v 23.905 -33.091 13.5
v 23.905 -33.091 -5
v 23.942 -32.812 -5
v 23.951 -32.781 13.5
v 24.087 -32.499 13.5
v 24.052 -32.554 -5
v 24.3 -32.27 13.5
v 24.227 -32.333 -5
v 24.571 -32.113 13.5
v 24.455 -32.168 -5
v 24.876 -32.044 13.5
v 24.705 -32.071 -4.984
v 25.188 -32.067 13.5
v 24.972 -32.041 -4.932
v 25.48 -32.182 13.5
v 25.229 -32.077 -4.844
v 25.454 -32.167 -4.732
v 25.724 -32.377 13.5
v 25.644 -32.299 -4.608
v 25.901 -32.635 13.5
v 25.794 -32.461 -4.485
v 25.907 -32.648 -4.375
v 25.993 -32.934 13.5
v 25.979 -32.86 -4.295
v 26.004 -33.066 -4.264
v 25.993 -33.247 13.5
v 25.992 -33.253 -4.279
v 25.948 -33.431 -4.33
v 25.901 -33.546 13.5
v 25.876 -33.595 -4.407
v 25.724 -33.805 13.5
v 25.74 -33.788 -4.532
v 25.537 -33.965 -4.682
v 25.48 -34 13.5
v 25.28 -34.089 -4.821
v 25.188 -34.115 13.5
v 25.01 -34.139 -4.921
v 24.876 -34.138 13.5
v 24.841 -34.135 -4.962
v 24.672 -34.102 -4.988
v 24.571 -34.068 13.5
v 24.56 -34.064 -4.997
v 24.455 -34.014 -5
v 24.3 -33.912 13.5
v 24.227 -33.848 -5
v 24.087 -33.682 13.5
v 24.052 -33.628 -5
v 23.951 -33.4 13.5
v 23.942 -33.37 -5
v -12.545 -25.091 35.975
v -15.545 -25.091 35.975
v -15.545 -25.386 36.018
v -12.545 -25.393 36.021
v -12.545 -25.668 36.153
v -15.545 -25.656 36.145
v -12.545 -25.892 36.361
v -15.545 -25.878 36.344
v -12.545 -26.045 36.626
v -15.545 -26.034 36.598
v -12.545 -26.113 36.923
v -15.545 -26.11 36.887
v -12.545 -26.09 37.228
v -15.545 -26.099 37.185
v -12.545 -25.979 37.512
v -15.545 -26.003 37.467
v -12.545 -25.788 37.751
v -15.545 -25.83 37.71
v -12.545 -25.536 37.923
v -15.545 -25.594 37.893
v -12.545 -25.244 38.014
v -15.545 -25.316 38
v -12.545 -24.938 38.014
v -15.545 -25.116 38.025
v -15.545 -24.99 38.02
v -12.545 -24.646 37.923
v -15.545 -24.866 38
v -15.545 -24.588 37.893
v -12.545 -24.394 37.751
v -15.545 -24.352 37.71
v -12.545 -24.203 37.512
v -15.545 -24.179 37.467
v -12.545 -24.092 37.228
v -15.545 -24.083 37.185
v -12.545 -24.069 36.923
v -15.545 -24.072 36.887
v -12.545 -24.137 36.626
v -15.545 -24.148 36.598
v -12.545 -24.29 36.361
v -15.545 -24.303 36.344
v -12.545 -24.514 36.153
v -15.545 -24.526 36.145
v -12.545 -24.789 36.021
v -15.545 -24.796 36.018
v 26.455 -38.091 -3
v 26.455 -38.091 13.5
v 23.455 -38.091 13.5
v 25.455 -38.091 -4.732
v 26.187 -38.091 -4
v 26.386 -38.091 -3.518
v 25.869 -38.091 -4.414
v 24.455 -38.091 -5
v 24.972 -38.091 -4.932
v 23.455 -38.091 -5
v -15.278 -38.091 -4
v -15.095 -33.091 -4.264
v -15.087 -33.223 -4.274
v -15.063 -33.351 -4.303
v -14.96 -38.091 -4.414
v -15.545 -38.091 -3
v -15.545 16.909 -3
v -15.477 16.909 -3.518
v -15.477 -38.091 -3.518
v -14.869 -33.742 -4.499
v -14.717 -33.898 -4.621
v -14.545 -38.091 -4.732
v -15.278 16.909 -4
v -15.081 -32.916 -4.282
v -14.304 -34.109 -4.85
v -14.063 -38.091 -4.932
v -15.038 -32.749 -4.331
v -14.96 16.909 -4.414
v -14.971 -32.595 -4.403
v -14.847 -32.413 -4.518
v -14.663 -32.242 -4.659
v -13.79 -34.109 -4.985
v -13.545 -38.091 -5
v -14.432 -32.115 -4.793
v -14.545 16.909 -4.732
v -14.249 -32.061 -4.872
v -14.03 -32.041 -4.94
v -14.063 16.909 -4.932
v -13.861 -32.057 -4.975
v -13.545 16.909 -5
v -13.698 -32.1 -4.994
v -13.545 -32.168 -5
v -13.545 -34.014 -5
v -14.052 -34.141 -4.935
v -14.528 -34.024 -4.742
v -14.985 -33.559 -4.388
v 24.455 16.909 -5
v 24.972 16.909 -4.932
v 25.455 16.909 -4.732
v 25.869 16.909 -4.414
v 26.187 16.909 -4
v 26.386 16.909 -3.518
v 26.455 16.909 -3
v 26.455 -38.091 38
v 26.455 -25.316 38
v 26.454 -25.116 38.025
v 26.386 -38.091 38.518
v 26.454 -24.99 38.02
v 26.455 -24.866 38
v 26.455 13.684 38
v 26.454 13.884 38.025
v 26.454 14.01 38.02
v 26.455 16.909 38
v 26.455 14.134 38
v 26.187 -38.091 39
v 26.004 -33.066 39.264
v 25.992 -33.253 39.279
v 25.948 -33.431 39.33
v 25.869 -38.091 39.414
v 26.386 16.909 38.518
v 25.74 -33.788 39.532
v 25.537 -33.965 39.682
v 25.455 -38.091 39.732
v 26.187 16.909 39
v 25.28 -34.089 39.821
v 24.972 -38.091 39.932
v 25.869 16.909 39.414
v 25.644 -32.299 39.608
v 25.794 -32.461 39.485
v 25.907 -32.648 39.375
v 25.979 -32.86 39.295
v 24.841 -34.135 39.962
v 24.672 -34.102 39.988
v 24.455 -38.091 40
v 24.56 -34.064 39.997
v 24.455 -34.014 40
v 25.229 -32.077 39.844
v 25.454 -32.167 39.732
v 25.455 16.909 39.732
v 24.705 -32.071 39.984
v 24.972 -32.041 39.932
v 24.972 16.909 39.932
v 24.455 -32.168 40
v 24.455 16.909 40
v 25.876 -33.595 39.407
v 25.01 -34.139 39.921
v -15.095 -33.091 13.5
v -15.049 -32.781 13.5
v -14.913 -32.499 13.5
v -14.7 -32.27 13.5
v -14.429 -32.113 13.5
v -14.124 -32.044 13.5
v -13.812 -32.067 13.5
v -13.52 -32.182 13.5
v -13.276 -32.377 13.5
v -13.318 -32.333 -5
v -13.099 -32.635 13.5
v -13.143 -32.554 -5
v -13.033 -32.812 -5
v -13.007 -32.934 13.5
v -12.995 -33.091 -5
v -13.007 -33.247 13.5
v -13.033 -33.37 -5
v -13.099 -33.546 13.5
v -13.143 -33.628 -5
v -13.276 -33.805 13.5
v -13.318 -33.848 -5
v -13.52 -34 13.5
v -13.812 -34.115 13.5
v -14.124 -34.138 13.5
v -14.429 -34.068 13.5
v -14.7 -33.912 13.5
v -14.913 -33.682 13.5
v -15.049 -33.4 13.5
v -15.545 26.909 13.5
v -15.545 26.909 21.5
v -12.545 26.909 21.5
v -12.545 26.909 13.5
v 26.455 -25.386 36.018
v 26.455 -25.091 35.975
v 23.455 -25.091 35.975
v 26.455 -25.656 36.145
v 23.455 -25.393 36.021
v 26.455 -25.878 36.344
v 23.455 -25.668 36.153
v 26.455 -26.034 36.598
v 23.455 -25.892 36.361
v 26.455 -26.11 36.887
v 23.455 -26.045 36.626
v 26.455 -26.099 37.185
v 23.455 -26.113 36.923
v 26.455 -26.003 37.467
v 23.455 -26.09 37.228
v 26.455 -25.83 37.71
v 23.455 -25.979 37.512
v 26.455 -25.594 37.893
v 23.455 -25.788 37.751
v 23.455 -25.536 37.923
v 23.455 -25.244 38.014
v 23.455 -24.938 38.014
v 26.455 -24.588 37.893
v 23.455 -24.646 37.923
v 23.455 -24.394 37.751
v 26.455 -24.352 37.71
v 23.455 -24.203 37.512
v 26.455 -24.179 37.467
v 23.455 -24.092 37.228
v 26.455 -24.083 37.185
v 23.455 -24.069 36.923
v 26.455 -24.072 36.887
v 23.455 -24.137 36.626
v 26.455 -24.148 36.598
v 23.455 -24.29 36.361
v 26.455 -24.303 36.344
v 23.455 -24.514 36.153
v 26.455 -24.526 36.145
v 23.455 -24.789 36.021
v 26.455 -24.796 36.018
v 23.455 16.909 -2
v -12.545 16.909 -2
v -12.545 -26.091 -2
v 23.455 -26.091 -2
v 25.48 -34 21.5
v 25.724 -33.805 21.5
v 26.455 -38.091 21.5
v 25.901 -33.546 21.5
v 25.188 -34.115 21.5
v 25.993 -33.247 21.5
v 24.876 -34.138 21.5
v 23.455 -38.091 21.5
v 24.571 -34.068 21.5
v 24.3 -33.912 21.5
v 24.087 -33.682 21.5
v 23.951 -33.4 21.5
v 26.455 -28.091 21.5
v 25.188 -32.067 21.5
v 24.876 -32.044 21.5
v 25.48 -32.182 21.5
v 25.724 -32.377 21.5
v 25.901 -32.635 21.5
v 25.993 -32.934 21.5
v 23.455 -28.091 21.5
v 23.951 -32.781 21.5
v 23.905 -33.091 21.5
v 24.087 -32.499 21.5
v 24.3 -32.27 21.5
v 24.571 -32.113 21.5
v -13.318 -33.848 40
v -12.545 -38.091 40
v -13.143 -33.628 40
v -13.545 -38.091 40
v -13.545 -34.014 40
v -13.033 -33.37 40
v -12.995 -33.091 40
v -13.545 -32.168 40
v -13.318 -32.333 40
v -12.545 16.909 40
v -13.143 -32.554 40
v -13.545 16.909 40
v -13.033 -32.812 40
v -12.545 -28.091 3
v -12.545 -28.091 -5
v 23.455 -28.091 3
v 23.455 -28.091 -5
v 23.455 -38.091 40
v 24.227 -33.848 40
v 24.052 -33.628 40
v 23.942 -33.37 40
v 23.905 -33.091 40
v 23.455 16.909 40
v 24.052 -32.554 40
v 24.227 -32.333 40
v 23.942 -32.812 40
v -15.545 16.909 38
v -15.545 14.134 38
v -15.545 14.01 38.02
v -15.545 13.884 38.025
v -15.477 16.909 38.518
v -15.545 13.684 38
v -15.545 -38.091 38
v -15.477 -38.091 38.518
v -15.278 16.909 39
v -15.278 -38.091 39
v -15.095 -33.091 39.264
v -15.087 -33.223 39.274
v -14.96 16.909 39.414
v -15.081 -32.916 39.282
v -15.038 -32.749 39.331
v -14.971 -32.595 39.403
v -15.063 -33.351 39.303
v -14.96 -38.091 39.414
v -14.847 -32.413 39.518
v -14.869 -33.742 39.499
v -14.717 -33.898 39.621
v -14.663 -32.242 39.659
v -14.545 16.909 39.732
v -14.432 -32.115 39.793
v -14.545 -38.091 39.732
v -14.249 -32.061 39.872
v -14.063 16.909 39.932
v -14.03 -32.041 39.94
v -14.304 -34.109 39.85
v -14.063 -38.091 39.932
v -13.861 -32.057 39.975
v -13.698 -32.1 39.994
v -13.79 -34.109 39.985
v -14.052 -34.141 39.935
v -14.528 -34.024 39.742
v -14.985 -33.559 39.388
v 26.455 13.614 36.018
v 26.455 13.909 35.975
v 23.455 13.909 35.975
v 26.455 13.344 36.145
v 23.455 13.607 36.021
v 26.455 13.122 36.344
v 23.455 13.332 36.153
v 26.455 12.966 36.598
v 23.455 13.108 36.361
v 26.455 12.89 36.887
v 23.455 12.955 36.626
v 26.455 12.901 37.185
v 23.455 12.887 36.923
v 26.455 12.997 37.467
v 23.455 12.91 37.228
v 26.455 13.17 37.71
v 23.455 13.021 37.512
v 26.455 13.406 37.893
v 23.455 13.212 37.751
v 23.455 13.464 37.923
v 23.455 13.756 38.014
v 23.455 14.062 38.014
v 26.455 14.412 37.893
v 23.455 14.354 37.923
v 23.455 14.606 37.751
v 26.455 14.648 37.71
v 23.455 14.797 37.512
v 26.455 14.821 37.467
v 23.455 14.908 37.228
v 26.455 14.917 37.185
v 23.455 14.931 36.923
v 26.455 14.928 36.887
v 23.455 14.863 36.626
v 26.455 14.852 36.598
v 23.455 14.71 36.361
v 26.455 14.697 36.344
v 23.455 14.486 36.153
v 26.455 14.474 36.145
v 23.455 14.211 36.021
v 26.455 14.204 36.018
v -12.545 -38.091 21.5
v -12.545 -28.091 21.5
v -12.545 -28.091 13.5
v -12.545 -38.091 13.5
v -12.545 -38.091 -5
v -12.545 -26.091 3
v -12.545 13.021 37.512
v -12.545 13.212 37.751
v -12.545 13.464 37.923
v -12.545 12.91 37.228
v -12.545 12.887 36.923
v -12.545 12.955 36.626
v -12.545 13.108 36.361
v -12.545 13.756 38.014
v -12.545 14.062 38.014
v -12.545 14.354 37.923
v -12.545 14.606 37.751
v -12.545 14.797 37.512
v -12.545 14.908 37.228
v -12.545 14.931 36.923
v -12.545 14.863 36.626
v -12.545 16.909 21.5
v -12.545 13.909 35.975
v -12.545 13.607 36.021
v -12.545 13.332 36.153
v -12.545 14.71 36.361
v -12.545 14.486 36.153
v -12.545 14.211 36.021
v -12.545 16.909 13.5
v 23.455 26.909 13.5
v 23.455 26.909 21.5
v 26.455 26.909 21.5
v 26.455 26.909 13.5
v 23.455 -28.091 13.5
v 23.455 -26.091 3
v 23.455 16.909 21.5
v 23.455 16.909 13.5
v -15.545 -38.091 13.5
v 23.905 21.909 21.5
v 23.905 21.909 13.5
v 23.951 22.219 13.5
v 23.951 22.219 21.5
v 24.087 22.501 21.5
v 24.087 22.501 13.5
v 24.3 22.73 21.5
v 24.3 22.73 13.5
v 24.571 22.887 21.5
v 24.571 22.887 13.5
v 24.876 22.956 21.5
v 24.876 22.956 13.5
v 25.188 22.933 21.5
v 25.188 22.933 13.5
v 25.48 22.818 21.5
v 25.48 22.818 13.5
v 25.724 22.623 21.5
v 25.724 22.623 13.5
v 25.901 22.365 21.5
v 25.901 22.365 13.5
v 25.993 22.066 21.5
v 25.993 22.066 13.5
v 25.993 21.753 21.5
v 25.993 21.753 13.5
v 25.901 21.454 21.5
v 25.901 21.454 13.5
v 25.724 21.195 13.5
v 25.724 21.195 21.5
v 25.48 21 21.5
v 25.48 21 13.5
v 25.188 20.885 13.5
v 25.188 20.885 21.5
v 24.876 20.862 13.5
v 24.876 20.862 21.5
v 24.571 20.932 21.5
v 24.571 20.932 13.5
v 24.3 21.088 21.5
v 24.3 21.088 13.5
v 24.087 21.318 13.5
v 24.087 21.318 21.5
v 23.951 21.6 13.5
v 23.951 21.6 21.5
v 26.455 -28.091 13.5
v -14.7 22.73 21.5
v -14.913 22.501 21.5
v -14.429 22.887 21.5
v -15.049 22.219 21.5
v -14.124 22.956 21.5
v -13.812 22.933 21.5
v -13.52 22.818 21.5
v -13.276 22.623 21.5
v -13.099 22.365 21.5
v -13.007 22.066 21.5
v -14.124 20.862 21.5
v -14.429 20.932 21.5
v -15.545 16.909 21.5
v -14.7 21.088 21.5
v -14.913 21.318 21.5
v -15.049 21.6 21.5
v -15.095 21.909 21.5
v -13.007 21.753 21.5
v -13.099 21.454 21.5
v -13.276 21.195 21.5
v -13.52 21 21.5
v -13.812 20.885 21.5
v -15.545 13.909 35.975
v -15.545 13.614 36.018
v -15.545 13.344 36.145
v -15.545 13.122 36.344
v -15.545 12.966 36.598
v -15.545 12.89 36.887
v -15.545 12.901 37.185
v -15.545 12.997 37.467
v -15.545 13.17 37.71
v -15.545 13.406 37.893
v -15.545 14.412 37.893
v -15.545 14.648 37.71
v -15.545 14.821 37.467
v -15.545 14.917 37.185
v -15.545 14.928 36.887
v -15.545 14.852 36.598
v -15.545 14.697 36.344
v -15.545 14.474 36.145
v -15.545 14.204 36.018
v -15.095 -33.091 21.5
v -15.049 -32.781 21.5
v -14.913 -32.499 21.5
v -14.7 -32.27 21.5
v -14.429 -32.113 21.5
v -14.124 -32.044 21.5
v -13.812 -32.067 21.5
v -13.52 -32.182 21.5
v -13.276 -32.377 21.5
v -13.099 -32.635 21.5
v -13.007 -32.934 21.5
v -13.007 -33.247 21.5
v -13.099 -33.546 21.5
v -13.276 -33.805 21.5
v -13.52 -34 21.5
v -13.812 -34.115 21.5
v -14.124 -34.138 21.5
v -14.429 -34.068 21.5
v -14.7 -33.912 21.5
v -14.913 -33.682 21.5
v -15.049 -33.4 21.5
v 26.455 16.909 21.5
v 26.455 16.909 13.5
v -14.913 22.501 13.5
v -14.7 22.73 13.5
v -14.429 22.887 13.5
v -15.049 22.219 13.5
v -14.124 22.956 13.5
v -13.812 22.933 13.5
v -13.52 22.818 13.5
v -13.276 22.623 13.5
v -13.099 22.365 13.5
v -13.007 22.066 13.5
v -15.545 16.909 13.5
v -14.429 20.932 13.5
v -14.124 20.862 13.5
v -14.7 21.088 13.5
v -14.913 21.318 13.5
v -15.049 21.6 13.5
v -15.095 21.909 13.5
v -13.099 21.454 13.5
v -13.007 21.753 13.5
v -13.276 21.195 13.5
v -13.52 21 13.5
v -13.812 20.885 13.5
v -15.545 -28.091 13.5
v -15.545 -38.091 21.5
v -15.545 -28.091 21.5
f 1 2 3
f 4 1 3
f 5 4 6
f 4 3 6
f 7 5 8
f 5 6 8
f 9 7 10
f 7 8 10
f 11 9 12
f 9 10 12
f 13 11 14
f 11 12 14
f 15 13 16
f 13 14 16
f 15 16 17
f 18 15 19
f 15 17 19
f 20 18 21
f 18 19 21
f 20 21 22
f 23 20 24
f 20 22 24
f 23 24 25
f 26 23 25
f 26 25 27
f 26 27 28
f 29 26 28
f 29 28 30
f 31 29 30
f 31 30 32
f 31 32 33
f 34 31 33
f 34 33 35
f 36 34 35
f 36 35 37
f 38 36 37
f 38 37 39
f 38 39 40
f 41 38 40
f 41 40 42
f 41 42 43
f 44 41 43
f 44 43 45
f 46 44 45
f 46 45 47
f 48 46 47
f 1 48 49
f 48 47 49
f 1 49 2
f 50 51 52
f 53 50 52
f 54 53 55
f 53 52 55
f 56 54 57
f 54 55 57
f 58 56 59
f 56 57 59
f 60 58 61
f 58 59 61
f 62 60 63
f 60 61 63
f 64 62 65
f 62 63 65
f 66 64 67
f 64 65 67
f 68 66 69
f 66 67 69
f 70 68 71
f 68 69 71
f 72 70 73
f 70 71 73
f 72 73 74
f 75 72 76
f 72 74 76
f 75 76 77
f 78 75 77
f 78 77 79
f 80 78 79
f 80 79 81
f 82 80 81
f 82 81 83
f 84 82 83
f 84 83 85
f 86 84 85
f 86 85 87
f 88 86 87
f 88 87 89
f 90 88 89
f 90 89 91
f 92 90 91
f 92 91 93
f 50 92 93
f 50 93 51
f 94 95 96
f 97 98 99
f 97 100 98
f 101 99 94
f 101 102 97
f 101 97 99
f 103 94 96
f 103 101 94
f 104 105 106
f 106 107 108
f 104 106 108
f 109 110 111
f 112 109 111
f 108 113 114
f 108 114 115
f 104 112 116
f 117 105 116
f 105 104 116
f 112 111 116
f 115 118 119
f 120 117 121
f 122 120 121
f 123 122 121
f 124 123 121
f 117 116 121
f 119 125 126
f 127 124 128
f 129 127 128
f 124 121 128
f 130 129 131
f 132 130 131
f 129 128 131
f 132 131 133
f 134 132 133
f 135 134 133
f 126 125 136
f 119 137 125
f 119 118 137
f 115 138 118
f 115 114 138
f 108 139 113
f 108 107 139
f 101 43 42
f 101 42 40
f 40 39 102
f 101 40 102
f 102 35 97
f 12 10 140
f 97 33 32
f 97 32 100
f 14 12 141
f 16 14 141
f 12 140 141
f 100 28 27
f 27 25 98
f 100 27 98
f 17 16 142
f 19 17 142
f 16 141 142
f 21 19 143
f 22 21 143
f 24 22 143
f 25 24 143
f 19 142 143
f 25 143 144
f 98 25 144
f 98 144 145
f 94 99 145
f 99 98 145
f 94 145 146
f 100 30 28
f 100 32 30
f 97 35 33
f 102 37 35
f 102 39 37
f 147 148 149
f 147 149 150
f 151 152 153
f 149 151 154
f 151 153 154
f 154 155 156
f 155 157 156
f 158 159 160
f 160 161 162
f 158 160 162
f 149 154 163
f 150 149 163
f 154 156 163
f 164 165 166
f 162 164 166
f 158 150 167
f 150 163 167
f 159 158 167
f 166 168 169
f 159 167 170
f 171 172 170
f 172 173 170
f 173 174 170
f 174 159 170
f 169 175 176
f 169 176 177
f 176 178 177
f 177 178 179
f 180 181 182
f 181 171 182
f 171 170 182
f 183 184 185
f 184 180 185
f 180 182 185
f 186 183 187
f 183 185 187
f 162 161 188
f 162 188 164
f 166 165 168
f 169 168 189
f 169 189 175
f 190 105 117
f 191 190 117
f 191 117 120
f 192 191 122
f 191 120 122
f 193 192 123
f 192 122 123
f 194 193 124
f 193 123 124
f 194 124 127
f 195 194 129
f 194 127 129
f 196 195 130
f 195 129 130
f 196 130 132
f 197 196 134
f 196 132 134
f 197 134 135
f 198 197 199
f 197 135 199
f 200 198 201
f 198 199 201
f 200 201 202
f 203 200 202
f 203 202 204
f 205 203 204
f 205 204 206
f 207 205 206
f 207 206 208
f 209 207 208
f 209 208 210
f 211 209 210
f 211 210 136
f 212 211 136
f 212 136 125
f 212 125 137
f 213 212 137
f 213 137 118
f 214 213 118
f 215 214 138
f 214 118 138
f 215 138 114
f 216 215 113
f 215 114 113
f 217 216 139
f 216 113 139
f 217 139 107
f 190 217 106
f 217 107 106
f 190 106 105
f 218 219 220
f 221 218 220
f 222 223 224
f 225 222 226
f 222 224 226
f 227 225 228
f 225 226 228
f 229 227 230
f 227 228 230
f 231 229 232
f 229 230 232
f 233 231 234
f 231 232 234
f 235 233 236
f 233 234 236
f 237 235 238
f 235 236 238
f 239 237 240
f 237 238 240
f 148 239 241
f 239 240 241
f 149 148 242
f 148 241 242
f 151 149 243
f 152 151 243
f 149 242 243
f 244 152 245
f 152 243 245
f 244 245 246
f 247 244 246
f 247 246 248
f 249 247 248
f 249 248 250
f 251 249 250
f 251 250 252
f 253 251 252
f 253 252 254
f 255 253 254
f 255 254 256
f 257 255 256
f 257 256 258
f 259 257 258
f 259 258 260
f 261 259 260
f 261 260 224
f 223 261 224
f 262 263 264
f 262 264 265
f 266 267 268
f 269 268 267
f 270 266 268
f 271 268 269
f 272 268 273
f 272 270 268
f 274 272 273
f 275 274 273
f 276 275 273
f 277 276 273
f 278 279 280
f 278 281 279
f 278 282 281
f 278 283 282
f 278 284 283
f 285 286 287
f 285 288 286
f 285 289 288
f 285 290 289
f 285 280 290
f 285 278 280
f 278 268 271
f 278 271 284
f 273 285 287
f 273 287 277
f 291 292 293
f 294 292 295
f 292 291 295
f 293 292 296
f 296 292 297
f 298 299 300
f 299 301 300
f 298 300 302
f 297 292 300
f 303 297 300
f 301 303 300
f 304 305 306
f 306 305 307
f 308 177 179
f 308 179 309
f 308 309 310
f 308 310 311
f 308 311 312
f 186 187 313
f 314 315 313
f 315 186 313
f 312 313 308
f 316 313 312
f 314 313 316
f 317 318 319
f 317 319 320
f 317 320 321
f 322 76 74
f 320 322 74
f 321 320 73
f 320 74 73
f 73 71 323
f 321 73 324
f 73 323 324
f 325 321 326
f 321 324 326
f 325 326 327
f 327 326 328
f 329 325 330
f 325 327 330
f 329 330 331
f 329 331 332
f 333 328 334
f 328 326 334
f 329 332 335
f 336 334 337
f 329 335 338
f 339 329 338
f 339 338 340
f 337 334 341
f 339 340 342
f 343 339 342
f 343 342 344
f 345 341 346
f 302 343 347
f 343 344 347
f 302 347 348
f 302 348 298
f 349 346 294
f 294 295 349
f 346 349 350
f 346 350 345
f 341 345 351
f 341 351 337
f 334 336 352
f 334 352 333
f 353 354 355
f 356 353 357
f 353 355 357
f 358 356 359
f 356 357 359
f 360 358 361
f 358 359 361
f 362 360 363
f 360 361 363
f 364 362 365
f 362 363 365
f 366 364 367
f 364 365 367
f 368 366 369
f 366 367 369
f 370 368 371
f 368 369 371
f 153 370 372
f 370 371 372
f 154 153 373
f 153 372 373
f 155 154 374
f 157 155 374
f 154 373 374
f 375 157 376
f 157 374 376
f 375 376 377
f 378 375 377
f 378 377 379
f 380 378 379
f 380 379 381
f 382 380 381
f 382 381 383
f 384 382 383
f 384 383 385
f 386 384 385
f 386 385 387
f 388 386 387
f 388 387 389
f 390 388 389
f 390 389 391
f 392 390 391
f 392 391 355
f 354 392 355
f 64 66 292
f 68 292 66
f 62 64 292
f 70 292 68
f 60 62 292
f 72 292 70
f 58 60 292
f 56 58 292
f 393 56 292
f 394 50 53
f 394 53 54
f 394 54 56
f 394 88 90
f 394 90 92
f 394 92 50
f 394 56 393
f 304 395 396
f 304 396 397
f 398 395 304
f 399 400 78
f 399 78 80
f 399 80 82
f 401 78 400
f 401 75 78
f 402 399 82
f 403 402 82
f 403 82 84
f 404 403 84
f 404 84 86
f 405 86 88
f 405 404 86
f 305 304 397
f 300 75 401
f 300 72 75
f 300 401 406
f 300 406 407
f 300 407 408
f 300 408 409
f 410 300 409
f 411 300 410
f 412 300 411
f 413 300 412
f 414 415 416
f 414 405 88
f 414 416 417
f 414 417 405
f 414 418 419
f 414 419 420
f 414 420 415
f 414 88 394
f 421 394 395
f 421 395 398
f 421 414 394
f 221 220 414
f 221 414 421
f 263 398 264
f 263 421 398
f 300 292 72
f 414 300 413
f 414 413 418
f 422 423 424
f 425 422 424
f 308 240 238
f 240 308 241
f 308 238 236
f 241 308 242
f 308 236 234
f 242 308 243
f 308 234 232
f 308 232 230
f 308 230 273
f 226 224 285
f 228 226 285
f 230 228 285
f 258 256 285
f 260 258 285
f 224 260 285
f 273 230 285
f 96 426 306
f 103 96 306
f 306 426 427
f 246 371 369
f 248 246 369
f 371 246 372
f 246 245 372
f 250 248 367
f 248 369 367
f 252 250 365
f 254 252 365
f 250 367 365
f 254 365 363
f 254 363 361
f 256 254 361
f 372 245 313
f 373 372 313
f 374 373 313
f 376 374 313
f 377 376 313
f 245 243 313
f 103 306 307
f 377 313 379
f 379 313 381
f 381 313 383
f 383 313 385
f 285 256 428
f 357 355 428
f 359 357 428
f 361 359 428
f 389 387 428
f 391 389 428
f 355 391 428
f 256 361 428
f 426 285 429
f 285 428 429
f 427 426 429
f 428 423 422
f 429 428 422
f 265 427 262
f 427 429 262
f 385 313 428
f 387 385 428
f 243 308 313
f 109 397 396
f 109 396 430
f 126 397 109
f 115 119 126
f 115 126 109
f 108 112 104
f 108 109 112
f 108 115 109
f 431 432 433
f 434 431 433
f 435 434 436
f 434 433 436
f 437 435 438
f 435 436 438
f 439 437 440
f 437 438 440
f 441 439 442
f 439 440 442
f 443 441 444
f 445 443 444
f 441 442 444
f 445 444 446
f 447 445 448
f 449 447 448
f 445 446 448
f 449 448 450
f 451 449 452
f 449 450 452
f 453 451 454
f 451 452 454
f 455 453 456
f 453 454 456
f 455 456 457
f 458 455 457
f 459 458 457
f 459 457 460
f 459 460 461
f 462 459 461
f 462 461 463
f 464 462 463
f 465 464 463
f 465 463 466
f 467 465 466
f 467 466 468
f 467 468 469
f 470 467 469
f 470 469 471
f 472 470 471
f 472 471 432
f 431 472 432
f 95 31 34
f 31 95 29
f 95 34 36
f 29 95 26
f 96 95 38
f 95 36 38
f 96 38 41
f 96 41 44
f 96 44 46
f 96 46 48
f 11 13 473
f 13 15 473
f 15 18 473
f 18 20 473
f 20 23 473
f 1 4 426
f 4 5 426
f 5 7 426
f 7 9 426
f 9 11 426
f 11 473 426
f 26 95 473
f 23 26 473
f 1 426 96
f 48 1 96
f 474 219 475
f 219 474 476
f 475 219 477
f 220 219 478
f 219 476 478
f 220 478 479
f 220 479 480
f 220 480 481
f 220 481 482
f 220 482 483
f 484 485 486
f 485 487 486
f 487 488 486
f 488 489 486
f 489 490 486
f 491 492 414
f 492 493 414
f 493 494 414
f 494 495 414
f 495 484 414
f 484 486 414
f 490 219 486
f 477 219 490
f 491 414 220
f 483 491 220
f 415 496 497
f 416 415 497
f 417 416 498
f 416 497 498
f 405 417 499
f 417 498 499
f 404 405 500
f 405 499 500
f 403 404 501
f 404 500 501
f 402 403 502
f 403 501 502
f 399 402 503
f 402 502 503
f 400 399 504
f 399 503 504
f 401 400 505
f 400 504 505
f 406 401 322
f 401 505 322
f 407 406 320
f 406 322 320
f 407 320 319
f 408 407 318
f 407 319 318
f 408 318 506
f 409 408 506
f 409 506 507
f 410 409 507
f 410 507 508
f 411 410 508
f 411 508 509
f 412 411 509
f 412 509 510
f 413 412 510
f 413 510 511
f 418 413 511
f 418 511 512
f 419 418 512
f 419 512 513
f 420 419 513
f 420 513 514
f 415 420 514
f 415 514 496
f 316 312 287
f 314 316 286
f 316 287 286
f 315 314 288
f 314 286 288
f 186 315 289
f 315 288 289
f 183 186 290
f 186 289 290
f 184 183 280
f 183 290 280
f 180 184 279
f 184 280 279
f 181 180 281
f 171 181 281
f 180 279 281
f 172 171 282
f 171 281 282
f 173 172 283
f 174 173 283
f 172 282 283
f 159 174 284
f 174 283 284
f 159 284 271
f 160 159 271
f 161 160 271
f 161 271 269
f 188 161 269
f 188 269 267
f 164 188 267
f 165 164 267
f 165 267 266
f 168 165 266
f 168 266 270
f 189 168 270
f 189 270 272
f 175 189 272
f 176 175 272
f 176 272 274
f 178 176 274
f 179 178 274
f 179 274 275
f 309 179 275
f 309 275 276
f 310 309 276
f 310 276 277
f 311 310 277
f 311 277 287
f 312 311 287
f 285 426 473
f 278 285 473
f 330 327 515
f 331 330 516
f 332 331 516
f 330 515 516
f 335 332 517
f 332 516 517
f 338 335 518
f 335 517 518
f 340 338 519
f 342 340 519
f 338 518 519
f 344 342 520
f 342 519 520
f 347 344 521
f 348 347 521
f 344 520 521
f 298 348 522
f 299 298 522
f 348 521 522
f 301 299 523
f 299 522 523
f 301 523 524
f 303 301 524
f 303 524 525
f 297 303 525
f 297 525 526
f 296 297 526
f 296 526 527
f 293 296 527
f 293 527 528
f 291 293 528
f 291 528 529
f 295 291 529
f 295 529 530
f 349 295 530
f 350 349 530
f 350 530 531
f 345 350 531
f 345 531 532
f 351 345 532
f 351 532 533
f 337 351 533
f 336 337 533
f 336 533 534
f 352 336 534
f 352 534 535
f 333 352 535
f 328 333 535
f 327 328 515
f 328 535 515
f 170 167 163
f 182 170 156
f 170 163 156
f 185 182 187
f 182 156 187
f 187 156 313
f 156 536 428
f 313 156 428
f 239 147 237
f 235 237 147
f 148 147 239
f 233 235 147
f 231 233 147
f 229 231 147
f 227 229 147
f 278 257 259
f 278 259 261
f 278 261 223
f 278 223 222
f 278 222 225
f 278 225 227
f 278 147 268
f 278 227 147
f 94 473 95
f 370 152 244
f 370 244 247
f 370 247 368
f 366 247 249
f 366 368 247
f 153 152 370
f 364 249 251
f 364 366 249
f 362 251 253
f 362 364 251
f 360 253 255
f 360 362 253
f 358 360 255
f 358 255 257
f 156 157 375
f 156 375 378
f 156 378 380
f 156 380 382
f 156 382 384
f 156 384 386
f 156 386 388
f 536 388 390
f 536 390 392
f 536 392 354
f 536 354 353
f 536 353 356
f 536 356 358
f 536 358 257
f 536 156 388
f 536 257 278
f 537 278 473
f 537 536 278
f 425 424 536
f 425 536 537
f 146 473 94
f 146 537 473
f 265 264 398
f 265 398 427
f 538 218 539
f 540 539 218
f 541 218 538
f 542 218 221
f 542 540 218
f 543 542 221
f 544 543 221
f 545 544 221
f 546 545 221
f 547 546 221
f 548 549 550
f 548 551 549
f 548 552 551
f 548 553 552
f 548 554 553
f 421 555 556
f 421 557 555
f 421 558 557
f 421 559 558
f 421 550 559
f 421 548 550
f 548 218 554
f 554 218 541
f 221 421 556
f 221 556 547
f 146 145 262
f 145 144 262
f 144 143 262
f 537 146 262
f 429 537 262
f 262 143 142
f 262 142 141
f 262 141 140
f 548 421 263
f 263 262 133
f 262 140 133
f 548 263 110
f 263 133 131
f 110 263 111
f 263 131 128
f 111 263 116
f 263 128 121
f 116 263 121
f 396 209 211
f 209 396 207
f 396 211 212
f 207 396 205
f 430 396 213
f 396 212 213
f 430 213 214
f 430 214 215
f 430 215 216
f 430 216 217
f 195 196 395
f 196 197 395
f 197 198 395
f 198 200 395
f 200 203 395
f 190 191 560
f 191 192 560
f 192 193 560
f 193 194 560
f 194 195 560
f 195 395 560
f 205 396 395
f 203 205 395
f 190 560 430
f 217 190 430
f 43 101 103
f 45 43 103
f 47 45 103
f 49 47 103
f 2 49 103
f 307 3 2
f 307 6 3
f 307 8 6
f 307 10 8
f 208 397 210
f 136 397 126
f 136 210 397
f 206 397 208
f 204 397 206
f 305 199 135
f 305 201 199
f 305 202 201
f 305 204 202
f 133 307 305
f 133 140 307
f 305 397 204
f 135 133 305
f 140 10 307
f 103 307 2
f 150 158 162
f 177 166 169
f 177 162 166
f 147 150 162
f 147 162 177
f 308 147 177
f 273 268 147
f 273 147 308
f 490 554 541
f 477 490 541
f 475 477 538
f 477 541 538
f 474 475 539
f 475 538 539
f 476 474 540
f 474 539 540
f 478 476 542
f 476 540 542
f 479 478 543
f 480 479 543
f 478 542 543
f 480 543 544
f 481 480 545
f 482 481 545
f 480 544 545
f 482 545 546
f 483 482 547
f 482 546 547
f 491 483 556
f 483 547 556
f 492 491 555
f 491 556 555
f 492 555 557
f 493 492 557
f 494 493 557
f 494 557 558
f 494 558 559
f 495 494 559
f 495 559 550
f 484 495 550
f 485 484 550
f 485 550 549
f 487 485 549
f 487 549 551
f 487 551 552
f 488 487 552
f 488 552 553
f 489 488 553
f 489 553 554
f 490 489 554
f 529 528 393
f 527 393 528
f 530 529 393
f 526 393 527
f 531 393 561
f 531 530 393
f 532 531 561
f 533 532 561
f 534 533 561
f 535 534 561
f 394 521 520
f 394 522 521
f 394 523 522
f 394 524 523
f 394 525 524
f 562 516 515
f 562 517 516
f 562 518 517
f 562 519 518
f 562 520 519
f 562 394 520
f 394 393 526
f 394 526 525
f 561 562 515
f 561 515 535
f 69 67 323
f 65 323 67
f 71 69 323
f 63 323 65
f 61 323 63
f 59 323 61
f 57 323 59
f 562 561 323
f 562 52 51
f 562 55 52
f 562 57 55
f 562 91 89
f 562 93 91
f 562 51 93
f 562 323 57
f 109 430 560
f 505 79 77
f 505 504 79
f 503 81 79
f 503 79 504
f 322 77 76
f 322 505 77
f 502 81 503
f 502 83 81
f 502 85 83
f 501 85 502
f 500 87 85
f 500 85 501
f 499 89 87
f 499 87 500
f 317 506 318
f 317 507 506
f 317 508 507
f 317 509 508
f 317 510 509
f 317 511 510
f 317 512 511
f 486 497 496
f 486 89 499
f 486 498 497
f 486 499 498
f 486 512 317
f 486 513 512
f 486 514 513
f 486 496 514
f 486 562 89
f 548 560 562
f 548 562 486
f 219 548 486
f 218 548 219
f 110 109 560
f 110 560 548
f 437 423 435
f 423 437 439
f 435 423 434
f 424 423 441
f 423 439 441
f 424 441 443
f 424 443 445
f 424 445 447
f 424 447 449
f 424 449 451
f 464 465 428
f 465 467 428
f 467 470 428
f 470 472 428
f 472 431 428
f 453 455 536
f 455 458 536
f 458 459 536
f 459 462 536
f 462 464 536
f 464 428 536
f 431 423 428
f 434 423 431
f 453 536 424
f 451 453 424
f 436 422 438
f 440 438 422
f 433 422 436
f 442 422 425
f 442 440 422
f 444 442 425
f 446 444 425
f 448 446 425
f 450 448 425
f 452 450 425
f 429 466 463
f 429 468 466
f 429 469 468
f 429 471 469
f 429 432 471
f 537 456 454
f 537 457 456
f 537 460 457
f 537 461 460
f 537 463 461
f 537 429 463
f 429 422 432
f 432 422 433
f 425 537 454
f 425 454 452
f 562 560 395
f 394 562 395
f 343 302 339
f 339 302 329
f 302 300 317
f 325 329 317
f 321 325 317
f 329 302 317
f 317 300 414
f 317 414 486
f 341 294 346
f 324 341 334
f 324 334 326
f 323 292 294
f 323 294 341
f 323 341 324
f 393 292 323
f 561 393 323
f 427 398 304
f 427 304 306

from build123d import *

# Parameters (mm, degrees)
EXTRUDE_1_DEPTH      = 40
EXTRUDE_1_DEPTH_BACK = 5
SKETCH_2_W           = 36
SKETCH_2_H           = 37
CUT_EXTRUDE_1_DEPTH  = 50
SKETCH_5_W           = 36
SKETCH_5_H           = 5
CUT_EXTRUDE_4_DEPTH  = 43
SKETCH_9_R           = 1.025
CUT_EXTRUDE_5_DEPTH  = 45.5
SKETCH_10_W          = 3
SKETCH_10_H          = 8
EXTRUDE_4_DEPTH      = 10
SKETCH_11_W          = 3
SKETCH_11_H          = 18.5
EXTRUDE_5_DEPTH      = 10
SKETCH_12_R          = 1.05
CUT_EXTRUDE_6_DEPTH  = 10
SKETCH_13_R          = 1.05
CUT_EXTRUDE_7_DEPTH  = 63.5
FILLET_4_R           = 2
FILLET_5_R           = 2
FILLET_6_R           = 2
FILLET_7_R           = 2


with BuildPart() as part:
    # 草圖1 → 填料-伸長1 (new, two sides: drawn at the far end of the back side and taken through both)
    with BuildSketch(Plane.XY.offset(-EXTRUDE_1_DEPTH_BACK)):
        Polygon((-14.545454545, -28.090909091), (-15.545454545, -28.090909091), (-15.545454545, 16.909090909), (-14.545454545, 16.909090909), (25.454545455, 16.909090909), (26.454545455, 16.909090909), (26.454545455, -28.090909091), (25.454545455, -28.090909091), align=None)
    extrude(amount=EXTRUDE_1_DEPTH + EXTRUDE_1_DEPTH_BACK)

    # 草圖2 → 除料-伸長1 (cut)
    with BuildSketch(Plane(origin=(0, 16.909090909, 0), x_dir=(1, 0, 0), z_dir=(0, 1, 0))):
        with Locations((5.454545455, -21.5)):
            Rectangle(SKETCH_2_W, SKETCH_2_H)
    extrude(amount=-CUT_EXTRUDE_1_DEPTH, mode=Mode.SUBTRACT)

    # 草圖5 → 除料-伸長4 (cut)
    with BuildSketch(Plane(origin=(0, 16.909090909, 0), x_dir=(1, 0, 0), z_dir=(0, 1, 0))):
        with Locations((5.454545455, -0.5)):
            Rectangle(SKETCH_5_W, SKETCH_5_H)
    extrude(amount=-CUT_EXTRUDE_4_DEPTH, mode=Mode.SUBTRACT)

    # 草圖9 → 除料-伸長5 (cut)
    with BuildSketch(Plane.ZY.offset(15.545454545)):
        with Locations(Location((37, -25.090909091, 0), (0, 0, 180))):
            Circle(SKETCH_9_R)
        with Locations(Location((37, 13.909090909, 0), (0, 0, 180))):
            Circle(SKETCH_9_R)
    extrude(amount=-CUT_EXTRUDE_5_DEPTH, mode=Mode.SUBTRACT)

    # 草圖10 → 填料-伸長4 (add)
    with BuildSketch(Plane(origin=(0, 16.909090909, 0), x_dir=(1, 0, 0), z_dir=(0, 1, 0))):
        with Locations((-14.045454545, -17.5)):
            Rectangle(SKETCH_10_W, SKETCH_10_H)
        with Locations((24.954545455, -17.5)):
            Rectangle(SKETCH_10_W, SKETCH_10_H)
    extrude(amount=EXTRUDE_4_DEPTH)

    # 草圖11 → 填料-伸長5 (add)
    with BuildSketch(Plane(origin=(0, -28.090909091, 0), x_dir=(-1, 0, 0), z_dir=(0, -1, 0))):
        with Locations((-24.954545455, -30.75)):
            Rectangle(SKETCH_11_W, SKETCH_11_H)
        with Locations((-24.954545455, -4.25)):
            Rectangle(SKETCH_11_W, SKETCH_11_H)
        with Locations((14.045454545, -30.75)):
            Rectangle(SKETCH_11_W, SKETCH_11_H)
        with Locations((14.045454545, -4.25)):
            Rectangle(SKETCH_11_W, SKETCH_11_H)
    extrude(amount=EXTRUDE_5_DEPTH)

    # 草圖12 → 除料-伸長6 (cut)
    with BuildSketch(Plane(origin=(0, 0, 13.5), x_dir=(-1, 0, 0), z_dir=(0, 0, -1))):
        with Locations((-24.954545455, 21.909090909)):
            Circle(SKETCH_12_R)
        with Locations((14.045454545, 21.909090909)):
            Circle(SKETCH_12_R)
    extrude(amount=-CUT_EXTRUDE_6_DEPTH, mode=Mode.SUBTRACT)

    # 草圖13 → 除料-伸長7 (cut)
    with BuildSketch(Plane(origin=(0, 0, -5), x_dir=(-1, 0, 0), z_dir=(0, 0, -1))):
        with Locations((-24.954545455, -33.090909091)):
            Circle(SKETCH_13_R)
        with Locations((14.045454545, -33.090909091)):
            Circle(SKETCH_13_R)
    extrude(amount=-CUT_EXTRUDE_7_DEPTH, mode=Mode.SUBTRACT)

    # 圓角4
    # the kernel refuses this fillet: 2 mm, written as the material it takes off along each edge
    with BuildSketch(Plane(origin=(26.454545455, 21.909090909, -5), x_dir=(-1, 0, 0), z_dir=(0, -1, 0))) as fillet_4_piece_1:
        with BuildLine():
            CenterArc((FILLET_4_R, -FILLET_4_R), FILLET_4_R, 90, 90)
            Line((0, -FILLET_4_R), (0, 0))
            Line((0, 0), (FILLET_4_R, 0))
        make_face()
    extrude(amount=65, mode=Mode.SUBTRACT)

    # 圓角5
    # the kernel refuses this fillet: 2 mm, written as the material it takes off along each edge
    with BuildSketch(Plane(origin=(-15.545454545, 21.909090909, -5), x_dir=(0, 0, 1), z_dir=(0, -1, 0))) as fillet_5_piece_1:
        with BuildLine():
            CenterArc((FILLET_5_R, -FILLET_5_R), FILLET_5_R, 90, 90)
            Line((0, -FILLET_5_R), (0, 0))
            Line((0, 0), (FILLET_5_R, 0))
        make_face()
    extrude(amount=65, mode=Mode.SUBTRACT)

    # 圓角6
    # the kernel refuses this fillet: 2 mm, written as the material it takes off along each edge
    with BuildSketch(Plane(origin=(26.454545455, 21.909090909, 40), x_dir=(0, 0, -1), z_dir=(0, -1, 0))) as fillet_6_piece_1:
        with BuildLine():
            CenterArc((FILLET_6_R, -FILLET_6_R), FILLET_6_R, 90, 90)
            Line((0, -FILLET_6_R), (0, 0))
            Line((0, 0), (FILLET_6_R, 0))
        make_face()
    extrude(amount=65, mode=Mode.SUBTRACT)

    # 圓角7
    # the kernel refuses this fillet: 2 mm, written as the material it takes off along each edge
    with BuildSketch(Plane(origin=(-15.545454545, -43.090909091, 40), x_dir=(0, 0, -1), z_dir=(0, 1, 0))) as fillet_7_piece_1:
        with BuildLine():
            CenterArc((FILLET_7_R, -FILLET_7_R), FILLET_7_R, 90, 90)
            Line((0, -FILLET_7_R), (0, 0))
            Line((0, 0), (FILLET_7_R, 0))
        make_face()
    extrude(amount=65, mode=Mode.SUBTRACT)


solid = part.part
